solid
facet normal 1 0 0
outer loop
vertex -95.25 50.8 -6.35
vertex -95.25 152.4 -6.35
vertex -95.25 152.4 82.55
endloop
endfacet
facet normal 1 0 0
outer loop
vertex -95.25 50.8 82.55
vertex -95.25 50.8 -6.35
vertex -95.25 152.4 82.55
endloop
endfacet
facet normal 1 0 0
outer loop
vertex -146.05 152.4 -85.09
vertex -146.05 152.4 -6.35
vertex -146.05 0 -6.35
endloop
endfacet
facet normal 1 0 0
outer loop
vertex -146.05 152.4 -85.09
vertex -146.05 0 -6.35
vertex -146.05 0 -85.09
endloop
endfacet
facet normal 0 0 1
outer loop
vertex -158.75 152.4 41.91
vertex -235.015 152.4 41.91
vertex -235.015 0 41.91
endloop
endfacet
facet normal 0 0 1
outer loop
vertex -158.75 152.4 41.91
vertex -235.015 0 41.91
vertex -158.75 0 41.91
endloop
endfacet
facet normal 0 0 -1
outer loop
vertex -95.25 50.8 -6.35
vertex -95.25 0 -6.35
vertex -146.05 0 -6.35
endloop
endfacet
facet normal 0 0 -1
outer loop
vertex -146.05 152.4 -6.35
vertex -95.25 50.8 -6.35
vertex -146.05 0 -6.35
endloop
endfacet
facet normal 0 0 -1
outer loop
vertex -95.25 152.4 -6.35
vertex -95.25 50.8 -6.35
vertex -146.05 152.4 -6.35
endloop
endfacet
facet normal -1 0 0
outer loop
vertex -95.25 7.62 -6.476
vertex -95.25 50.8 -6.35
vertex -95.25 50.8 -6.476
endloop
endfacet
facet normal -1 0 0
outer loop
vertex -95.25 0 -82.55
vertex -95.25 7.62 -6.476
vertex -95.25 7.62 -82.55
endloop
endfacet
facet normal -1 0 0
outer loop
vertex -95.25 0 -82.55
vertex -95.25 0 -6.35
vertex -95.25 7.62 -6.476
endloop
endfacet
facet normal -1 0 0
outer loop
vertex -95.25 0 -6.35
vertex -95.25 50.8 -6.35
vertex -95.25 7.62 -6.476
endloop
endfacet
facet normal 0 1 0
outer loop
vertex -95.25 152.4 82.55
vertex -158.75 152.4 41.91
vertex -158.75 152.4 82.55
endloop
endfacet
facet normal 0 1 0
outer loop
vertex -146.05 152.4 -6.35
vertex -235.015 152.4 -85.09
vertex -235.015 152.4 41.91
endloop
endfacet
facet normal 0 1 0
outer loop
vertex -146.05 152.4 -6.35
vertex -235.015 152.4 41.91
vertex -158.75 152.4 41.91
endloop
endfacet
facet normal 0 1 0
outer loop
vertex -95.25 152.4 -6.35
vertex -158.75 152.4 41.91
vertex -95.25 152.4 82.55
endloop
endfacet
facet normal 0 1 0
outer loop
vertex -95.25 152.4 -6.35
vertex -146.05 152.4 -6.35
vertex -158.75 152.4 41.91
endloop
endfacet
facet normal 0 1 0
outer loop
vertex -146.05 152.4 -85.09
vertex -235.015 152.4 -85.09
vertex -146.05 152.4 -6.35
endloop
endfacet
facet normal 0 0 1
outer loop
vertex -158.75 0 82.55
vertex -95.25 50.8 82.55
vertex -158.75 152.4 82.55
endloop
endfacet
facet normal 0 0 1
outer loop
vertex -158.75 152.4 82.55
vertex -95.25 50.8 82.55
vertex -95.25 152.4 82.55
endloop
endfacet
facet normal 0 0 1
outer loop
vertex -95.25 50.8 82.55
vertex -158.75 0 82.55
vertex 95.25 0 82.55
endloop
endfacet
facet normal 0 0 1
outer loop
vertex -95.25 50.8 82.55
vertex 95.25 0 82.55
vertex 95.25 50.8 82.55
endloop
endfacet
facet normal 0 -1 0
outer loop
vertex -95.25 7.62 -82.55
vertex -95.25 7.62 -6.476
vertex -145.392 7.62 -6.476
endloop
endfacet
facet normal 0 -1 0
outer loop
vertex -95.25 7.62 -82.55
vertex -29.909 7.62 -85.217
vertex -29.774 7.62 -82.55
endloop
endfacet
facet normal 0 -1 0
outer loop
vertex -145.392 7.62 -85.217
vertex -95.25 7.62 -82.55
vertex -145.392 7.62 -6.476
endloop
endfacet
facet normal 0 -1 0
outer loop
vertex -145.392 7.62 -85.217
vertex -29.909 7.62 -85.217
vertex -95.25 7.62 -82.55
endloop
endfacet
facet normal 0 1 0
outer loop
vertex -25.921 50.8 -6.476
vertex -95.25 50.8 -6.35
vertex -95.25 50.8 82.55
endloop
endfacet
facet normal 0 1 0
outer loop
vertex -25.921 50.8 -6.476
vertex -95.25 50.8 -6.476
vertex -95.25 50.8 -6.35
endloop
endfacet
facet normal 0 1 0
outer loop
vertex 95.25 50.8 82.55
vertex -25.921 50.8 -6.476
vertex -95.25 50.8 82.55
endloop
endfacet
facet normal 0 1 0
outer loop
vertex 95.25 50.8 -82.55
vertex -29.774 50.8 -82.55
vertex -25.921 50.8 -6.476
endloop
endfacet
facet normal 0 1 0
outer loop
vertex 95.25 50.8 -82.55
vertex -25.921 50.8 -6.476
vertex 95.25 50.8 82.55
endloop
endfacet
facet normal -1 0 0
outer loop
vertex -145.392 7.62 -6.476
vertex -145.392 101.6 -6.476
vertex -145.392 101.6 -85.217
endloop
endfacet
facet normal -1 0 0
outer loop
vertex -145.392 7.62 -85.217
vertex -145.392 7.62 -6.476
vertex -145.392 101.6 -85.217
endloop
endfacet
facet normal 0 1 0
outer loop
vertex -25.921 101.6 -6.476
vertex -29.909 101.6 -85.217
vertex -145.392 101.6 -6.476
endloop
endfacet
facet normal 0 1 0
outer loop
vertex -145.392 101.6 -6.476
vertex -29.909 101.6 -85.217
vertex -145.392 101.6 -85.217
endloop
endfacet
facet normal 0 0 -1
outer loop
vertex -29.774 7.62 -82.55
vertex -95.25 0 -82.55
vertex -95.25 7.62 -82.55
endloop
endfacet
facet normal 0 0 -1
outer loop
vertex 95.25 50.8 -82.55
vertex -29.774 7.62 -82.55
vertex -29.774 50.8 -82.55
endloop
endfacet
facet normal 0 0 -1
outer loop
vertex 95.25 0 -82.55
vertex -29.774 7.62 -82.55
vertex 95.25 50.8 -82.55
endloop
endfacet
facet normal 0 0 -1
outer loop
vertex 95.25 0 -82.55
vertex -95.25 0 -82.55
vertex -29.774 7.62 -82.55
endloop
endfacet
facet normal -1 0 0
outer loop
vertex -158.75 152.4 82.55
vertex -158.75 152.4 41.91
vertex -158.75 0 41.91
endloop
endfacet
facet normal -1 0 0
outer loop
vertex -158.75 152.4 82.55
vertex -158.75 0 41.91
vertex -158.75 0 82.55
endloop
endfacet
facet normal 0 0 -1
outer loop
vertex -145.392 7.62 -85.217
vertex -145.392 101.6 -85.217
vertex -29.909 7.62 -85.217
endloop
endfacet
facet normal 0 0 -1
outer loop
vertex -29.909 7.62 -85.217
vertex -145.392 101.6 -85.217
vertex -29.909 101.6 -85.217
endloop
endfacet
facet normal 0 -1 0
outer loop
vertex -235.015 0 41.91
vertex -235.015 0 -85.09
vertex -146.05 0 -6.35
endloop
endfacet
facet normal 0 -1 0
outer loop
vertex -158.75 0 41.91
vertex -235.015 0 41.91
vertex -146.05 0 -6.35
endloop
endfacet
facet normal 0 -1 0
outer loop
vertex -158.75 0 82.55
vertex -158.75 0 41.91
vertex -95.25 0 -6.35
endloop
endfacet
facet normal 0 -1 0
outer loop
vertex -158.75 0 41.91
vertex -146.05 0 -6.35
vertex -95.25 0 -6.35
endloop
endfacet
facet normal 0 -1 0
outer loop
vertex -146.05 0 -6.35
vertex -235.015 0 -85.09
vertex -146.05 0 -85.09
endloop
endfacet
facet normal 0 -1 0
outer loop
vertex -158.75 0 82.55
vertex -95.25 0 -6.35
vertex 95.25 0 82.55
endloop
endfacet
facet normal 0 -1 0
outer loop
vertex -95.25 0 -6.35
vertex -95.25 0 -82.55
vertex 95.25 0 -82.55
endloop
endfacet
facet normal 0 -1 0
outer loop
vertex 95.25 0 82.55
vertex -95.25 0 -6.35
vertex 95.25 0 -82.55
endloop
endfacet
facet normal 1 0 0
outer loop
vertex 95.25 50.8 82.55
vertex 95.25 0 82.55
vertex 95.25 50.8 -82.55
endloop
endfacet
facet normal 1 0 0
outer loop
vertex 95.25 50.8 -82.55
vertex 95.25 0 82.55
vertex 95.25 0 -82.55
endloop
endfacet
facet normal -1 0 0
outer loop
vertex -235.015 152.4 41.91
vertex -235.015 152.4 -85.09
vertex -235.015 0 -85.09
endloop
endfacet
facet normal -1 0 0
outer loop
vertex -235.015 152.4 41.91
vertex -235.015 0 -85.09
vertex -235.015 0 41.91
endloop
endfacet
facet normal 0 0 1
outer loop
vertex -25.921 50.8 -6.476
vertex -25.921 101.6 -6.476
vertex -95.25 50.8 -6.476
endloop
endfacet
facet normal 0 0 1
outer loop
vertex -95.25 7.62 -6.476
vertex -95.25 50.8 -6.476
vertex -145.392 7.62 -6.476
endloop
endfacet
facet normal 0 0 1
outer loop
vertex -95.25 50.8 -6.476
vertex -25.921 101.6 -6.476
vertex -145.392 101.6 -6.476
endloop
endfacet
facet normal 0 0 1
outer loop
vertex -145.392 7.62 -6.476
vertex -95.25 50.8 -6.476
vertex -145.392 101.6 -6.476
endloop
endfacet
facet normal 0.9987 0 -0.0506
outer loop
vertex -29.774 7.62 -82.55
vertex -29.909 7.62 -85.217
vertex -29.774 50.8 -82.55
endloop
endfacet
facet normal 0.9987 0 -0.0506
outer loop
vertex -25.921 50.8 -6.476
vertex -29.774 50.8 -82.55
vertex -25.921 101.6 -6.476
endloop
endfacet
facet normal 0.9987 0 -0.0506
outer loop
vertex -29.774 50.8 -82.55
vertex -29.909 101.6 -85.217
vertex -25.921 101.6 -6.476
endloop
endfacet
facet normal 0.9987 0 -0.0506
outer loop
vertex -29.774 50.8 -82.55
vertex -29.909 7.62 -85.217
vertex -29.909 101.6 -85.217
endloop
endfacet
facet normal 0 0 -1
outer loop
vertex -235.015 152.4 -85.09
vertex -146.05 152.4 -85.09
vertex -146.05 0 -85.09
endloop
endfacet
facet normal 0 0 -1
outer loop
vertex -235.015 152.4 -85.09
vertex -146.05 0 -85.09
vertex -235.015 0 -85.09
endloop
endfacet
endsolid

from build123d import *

# Parameters (mm, degrees)
SKETCH1_W           = 190.5
SKETCH1_H           = 165.1
BOSS_EXTRUDE1_DEPTH = 50.8
SKETCH2_W           = 88.9
SKETCH2_H           = 152.4
BOSS_EXTRUDE2_DEPTH = 63.5
BOSS_EXTRUDE3_DEPTH = 152.4
BOSS_EXTRUDE4_DEPTH = 93.98


with BuildPart() as part:
    # Sketch1 → Boss-Extrude1 (new body)
    with BuildSketch(Plane(origin=(0, 0, 0), x_dir=(1, 0, 0), z_dir=(0, 1, 0))):
        Rectangle(SKETCH1_W, SKETCH1_H)
    extrude(amount=BOSS_EXTRUDE1_DEPTH)

    # Sketch2 → Boss-Extrude2 (add)
    with BuildSketch(Plane.ZY.offset(95.25)):
        with Locations((38.1, 76.2)):
            Rectangle(SKETCH2_W, SKETCH2_H)
    extrude(amount=BOSS_EXTRUDE2_DEPTH)

    # Sketch3 → Boss-Extrude3 (add)
    with BuildSketch(Plane(origin=(0, 152.4, 0), x_dir=(1, 0, 0), z_dir=(0, 1, 0))):
        Polygon((-158.75, 6.35), (-146.05, 6.35), (-146.05, 85.09), (-235.014810015, 85.09), (-235.014810015, -41.91), (-158.75, -41.91), align=None)
    extrude(amount=-BOSS_EXTRUDE3_DEPTH)

    # Sketch9 → Boss-Extrude4 (add)
    with BuildSketch(Plane(origin=(0, 101.6, 0), x_dir=(1, 0, 0), z_dir=(0, 1, 0))):
        Polygon((-145.392235631, 6.475919558), (-145.392235631, 85.217024974), (-29.908989465, 85.217024974), (-25.920545989, 6.475919558), align=None)
    extrude(amount=-BOSS_EXTRUDE4_DEPTH)


solid = part.part
